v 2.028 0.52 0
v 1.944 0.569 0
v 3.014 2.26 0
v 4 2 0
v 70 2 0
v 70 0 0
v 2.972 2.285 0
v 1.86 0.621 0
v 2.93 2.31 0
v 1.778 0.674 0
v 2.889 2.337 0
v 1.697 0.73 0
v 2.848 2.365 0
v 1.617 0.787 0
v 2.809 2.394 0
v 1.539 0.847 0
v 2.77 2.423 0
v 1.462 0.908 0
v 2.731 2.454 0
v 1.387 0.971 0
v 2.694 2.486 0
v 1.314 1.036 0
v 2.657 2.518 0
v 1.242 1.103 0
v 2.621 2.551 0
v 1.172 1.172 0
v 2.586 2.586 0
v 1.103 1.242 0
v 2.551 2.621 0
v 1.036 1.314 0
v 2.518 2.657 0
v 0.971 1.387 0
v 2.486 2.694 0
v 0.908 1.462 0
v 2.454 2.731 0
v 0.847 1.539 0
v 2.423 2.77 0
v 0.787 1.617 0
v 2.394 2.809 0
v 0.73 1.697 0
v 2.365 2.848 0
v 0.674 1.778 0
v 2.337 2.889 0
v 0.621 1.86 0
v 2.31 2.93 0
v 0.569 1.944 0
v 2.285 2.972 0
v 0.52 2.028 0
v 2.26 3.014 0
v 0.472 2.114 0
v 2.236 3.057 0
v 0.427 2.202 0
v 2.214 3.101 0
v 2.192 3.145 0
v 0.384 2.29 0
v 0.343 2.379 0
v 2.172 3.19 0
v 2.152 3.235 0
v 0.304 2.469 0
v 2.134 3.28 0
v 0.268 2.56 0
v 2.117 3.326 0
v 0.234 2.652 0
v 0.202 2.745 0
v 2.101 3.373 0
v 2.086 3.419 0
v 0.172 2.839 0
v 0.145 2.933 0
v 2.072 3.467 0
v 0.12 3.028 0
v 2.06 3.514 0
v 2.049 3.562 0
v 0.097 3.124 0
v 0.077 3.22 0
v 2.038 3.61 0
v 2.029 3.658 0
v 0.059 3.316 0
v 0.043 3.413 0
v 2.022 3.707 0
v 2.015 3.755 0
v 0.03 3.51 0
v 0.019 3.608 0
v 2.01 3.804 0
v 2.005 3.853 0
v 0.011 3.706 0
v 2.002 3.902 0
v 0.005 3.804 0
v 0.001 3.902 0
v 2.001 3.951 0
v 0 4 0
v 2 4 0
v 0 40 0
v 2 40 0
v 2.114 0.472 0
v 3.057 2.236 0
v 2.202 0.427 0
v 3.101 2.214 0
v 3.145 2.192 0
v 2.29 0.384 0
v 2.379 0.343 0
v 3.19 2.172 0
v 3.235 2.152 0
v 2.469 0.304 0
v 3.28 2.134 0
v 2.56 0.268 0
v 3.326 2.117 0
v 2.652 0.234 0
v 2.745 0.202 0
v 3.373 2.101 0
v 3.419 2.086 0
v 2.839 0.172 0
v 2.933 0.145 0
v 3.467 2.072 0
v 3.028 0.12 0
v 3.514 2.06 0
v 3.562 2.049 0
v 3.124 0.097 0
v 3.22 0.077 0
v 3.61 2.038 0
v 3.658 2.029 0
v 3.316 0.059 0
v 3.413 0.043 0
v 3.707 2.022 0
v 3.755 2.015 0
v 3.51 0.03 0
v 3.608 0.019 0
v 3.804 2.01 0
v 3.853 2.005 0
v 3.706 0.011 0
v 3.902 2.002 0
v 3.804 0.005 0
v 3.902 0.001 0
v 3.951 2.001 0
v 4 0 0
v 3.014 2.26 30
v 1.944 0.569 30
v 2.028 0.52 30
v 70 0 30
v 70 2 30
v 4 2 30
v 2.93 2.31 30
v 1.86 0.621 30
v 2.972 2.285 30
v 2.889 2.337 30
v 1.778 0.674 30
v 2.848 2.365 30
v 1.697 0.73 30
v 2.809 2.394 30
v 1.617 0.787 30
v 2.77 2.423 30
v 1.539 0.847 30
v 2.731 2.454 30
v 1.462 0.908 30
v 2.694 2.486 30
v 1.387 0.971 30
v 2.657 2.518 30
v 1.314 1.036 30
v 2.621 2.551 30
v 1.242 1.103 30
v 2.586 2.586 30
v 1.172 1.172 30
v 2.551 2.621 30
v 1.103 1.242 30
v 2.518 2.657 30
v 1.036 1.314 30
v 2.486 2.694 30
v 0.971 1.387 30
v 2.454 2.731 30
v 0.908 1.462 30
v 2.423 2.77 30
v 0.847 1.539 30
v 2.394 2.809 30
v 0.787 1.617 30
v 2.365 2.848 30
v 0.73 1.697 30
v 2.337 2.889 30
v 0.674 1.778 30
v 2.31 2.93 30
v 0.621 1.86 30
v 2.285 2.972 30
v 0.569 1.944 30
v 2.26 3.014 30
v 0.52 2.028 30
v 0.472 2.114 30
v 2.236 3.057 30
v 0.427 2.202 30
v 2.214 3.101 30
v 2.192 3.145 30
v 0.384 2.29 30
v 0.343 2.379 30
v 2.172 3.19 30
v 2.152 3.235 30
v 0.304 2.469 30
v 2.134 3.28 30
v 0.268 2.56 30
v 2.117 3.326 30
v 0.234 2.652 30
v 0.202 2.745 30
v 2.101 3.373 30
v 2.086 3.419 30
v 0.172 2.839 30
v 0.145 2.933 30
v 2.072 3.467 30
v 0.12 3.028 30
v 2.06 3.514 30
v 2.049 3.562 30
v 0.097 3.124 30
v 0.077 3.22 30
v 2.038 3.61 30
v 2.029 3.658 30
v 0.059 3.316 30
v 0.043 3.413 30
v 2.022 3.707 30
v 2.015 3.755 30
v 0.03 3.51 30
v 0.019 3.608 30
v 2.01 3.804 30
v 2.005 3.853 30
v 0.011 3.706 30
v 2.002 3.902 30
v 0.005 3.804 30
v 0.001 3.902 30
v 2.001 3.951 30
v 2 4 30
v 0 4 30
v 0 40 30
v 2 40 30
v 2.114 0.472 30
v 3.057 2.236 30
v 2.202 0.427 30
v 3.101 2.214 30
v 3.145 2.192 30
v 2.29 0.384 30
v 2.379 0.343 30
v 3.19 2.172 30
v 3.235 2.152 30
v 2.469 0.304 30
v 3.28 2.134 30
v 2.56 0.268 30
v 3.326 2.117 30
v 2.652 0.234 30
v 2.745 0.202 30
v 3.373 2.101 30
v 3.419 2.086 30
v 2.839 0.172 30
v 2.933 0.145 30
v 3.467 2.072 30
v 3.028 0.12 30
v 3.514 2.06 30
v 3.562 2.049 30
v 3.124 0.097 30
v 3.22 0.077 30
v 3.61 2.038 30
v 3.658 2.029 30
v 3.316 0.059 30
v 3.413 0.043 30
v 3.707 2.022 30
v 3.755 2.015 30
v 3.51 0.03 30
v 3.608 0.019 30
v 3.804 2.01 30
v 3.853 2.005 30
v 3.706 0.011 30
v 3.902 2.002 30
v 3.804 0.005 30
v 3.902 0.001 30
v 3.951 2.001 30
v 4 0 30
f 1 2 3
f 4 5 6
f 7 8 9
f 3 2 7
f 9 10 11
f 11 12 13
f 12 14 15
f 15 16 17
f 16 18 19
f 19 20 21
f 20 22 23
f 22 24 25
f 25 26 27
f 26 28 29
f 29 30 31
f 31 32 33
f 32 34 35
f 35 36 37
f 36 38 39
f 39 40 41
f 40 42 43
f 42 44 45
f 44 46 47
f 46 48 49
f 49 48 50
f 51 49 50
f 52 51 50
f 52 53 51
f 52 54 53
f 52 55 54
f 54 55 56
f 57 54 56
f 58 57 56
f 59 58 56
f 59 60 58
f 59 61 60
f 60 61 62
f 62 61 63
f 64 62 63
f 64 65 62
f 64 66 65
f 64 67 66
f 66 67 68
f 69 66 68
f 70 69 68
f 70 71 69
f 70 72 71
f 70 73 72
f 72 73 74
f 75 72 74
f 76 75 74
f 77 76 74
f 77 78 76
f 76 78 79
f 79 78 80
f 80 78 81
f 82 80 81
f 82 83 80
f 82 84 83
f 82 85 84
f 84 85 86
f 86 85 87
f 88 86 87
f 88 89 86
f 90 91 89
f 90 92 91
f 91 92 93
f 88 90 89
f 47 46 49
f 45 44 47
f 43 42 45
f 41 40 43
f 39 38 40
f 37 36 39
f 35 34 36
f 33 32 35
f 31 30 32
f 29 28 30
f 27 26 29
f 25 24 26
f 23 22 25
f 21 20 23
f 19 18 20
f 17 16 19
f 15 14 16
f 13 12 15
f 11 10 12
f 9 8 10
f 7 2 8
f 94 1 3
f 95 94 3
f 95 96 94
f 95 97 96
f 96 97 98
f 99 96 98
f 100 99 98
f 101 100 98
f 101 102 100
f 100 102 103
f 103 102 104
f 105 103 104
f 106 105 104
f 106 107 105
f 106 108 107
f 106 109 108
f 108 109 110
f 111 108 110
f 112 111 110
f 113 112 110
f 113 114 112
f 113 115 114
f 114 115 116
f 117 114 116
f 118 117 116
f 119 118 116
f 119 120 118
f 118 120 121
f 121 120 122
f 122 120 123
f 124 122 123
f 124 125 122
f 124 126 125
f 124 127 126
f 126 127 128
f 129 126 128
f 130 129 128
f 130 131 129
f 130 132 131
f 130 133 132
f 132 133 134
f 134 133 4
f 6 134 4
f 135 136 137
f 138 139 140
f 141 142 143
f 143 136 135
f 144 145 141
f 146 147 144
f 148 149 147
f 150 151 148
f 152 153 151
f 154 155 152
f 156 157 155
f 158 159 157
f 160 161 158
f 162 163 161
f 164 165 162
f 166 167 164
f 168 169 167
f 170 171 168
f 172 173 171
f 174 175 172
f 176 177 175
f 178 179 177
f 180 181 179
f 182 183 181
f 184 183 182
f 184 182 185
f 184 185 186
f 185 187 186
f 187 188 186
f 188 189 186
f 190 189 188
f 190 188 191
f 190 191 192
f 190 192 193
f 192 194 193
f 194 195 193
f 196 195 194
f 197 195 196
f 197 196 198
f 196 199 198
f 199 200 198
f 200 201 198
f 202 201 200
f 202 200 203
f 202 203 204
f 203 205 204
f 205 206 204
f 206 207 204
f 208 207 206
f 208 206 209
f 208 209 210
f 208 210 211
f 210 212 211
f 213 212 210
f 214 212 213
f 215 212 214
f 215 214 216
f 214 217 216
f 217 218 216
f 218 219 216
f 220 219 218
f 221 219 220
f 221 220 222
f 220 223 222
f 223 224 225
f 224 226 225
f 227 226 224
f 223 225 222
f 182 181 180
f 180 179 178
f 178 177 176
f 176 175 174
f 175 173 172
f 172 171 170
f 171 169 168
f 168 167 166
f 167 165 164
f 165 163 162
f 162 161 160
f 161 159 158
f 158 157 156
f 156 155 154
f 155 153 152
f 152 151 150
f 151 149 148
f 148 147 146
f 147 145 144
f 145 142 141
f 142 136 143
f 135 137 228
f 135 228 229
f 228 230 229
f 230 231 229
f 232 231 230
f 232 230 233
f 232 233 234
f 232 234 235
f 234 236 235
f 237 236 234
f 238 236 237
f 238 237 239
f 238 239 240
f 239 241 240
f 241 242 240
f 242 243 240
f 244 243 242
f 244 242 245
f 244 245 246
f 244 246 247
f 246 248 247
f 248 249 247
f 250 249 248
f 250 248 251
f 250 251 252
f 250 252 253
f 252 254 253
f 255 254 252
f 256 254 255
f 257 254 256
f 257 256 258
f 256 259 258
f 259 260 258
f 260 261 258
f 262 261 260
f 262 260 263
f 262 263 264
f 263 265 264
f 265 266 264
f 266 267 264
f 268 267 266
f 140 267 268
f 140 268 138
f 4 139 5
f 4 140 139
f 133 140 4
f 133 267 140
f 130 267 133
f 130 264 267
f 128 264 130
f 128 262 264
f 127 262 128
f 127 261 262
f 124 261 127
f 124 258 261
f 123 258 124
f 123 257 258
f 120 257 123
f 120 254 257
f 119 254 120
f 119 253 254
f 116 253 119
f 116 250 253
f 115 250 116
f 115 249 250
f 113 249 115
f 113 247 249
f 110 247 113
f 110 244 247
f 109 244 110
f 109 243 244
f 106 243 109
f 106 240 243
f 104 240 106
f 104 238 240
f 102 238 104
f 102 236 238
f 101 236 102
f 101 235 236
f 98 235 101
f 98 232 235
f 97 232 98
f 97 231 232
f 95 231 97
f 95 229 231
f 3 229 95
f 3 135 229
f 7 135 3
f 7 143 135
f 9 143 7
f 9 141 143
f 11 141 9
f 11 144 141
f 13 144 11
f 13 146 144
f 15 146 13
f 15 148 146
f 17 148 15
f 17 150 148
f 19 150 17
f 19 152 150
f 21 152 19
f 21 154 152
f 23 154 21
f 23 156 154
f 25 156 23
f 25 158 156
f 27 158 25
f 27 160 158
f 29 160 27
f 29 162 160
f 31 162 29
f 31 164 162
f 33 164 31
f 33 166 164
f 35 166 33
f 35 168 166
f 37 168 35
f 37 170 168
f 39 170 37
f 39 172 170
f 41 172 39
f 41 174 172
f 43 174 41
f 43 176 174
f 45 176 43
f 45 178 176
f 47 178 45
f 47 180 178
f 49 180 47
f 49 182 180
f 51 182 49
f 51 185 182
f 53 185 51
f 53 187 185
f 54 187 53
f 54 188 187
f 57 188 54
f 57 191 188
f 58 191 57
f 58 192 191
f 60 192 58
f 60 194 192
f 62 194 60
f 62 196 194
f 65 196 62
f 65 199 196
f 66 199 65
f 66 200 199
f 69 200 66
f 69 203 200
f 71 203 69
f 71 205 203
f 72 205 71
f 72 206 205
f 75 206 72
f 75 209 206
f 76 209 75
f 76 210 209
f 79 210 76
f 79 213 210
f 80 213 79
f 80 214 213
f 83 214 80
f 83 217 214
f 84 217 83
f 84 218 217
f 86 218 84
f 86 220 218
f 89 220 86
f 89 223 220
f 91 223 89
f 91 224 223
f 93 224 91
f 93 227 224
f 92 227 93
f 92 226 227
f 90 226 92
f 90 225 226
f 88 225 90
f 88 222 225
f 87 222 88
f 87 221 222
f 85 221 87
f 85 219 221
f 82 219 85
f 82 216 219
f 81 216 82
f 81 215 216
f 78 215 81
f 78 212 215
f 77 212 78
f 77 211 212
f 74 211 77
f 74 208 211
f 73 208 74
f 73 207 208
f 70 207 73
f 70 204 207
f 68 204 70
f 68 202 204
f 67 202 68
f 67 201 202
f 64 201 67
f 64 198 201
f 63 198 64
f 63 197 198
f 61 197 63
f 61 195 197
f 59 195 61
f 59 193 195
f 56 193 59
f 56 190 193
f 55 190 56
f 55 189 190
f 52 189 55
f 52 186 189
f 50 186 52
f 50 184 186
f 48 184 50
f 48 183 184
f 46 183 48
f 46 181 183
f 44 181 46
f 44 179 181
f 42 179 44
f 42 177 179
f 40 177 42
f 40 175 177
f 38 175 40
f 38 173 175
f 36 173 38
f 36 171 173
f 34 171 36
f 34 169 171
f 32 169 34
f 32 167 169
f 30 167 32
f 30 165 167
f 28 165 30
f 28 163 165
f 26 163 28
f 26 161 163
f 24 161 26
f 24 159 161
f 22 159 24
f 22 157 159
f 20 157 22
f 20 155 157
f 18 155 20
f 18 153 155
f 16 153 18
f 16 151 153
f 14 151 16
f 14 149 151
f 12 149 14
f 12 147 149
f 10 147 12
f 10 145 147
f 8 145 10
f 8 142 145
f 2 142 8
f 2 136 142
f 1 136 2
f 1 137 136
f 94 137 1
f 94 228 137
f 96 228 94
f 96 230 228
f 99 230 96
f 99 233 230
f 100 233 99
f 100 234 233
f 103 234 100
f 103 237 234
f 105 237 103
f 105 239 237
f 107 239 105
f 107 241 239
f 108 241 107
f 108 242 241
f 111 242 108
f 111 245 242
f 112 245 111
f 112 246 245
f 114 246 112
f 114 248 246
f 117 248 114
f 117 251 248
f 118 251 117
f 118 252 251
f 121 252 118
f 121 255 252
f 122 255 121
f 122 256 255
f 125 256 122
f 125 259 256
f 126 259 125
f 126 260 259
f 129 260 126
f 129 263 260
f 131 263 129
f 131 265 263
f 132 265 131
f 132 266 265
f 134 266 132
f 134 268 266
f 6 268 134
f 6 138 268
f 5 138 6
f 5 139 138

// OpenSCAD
thickness_mm = 2.0;
bend_radius_mm = 2.0;
width_mm = 30.0;
flange_a_mm = 70.0;
flange_b_mm = 40.0;
k_factor = 0.45;
bend_angle_deg = 90.0;

neutral_axis_radius_mm = bend_radius_mm + k_factor * thickness_mm;
bend_allowance_mm = (3.141592653589793 / 180.0) * bend_angle_deg * neutral_axis_radius_mm;
outside_setback_mm = bend_radius_mm + thickness_mm;
developed_flat_length_mm = flange_a_mm + flange_b_mm - 2.0 * outside_setback_mm + bend_allowance_mm;

// MAKERBENCH-SHEETMETAL: {"thickness_mm":2.0,"bend_radius_mm":2.0,"developed_flat_length_mm":106.5553093477052}
echo("MAKERBENCH-SHEETMETAL: {\"thickness_mm\":2.0,\"bend_radius_mm\":2.0,\"developed_flat_length_mm\":106.5553093477052}");

ro = bend_radius_mm + thickness_mm;
ri = bend_radius_mm;
arc_steps = 64;

function arc_points(c, r, a0, a1, steps) =
    [for (i = [0:steps])
        [c[0] + r * cos(a0 + (a1 - a0) * i / steps),
         c[1] + r * sin(a0 + (a1 - a0) * i / steps)]];

module formed_bracket_2d() {
    outer_arc = arc_points([ro, ro], ro, 180, 270, arc_steps);
    inner_arc = arc_points([ro, ro], ri, 270, 180, arc_steps);

    polygon(points = concat(
        [[ro, 0], [flange_a_mm, 0], [flange_a_mm, thickness_mm], [ro, thickness_mm]],
        [for (i = [1:len(inner_arc) - 1]) inner_arc[i]],
        [[ri, flange_b_mm], [0, flange_b_mm], [0, ro]],
        [for (i = [1:len(outer_arc) - 1]) outer_arc[i]]
    ));
}

module formed_bracket() {
    linear_extrude(height = width_mm, center = false, convexity = 10)
        formed_bracket_2d();
}

formed_bracket();
